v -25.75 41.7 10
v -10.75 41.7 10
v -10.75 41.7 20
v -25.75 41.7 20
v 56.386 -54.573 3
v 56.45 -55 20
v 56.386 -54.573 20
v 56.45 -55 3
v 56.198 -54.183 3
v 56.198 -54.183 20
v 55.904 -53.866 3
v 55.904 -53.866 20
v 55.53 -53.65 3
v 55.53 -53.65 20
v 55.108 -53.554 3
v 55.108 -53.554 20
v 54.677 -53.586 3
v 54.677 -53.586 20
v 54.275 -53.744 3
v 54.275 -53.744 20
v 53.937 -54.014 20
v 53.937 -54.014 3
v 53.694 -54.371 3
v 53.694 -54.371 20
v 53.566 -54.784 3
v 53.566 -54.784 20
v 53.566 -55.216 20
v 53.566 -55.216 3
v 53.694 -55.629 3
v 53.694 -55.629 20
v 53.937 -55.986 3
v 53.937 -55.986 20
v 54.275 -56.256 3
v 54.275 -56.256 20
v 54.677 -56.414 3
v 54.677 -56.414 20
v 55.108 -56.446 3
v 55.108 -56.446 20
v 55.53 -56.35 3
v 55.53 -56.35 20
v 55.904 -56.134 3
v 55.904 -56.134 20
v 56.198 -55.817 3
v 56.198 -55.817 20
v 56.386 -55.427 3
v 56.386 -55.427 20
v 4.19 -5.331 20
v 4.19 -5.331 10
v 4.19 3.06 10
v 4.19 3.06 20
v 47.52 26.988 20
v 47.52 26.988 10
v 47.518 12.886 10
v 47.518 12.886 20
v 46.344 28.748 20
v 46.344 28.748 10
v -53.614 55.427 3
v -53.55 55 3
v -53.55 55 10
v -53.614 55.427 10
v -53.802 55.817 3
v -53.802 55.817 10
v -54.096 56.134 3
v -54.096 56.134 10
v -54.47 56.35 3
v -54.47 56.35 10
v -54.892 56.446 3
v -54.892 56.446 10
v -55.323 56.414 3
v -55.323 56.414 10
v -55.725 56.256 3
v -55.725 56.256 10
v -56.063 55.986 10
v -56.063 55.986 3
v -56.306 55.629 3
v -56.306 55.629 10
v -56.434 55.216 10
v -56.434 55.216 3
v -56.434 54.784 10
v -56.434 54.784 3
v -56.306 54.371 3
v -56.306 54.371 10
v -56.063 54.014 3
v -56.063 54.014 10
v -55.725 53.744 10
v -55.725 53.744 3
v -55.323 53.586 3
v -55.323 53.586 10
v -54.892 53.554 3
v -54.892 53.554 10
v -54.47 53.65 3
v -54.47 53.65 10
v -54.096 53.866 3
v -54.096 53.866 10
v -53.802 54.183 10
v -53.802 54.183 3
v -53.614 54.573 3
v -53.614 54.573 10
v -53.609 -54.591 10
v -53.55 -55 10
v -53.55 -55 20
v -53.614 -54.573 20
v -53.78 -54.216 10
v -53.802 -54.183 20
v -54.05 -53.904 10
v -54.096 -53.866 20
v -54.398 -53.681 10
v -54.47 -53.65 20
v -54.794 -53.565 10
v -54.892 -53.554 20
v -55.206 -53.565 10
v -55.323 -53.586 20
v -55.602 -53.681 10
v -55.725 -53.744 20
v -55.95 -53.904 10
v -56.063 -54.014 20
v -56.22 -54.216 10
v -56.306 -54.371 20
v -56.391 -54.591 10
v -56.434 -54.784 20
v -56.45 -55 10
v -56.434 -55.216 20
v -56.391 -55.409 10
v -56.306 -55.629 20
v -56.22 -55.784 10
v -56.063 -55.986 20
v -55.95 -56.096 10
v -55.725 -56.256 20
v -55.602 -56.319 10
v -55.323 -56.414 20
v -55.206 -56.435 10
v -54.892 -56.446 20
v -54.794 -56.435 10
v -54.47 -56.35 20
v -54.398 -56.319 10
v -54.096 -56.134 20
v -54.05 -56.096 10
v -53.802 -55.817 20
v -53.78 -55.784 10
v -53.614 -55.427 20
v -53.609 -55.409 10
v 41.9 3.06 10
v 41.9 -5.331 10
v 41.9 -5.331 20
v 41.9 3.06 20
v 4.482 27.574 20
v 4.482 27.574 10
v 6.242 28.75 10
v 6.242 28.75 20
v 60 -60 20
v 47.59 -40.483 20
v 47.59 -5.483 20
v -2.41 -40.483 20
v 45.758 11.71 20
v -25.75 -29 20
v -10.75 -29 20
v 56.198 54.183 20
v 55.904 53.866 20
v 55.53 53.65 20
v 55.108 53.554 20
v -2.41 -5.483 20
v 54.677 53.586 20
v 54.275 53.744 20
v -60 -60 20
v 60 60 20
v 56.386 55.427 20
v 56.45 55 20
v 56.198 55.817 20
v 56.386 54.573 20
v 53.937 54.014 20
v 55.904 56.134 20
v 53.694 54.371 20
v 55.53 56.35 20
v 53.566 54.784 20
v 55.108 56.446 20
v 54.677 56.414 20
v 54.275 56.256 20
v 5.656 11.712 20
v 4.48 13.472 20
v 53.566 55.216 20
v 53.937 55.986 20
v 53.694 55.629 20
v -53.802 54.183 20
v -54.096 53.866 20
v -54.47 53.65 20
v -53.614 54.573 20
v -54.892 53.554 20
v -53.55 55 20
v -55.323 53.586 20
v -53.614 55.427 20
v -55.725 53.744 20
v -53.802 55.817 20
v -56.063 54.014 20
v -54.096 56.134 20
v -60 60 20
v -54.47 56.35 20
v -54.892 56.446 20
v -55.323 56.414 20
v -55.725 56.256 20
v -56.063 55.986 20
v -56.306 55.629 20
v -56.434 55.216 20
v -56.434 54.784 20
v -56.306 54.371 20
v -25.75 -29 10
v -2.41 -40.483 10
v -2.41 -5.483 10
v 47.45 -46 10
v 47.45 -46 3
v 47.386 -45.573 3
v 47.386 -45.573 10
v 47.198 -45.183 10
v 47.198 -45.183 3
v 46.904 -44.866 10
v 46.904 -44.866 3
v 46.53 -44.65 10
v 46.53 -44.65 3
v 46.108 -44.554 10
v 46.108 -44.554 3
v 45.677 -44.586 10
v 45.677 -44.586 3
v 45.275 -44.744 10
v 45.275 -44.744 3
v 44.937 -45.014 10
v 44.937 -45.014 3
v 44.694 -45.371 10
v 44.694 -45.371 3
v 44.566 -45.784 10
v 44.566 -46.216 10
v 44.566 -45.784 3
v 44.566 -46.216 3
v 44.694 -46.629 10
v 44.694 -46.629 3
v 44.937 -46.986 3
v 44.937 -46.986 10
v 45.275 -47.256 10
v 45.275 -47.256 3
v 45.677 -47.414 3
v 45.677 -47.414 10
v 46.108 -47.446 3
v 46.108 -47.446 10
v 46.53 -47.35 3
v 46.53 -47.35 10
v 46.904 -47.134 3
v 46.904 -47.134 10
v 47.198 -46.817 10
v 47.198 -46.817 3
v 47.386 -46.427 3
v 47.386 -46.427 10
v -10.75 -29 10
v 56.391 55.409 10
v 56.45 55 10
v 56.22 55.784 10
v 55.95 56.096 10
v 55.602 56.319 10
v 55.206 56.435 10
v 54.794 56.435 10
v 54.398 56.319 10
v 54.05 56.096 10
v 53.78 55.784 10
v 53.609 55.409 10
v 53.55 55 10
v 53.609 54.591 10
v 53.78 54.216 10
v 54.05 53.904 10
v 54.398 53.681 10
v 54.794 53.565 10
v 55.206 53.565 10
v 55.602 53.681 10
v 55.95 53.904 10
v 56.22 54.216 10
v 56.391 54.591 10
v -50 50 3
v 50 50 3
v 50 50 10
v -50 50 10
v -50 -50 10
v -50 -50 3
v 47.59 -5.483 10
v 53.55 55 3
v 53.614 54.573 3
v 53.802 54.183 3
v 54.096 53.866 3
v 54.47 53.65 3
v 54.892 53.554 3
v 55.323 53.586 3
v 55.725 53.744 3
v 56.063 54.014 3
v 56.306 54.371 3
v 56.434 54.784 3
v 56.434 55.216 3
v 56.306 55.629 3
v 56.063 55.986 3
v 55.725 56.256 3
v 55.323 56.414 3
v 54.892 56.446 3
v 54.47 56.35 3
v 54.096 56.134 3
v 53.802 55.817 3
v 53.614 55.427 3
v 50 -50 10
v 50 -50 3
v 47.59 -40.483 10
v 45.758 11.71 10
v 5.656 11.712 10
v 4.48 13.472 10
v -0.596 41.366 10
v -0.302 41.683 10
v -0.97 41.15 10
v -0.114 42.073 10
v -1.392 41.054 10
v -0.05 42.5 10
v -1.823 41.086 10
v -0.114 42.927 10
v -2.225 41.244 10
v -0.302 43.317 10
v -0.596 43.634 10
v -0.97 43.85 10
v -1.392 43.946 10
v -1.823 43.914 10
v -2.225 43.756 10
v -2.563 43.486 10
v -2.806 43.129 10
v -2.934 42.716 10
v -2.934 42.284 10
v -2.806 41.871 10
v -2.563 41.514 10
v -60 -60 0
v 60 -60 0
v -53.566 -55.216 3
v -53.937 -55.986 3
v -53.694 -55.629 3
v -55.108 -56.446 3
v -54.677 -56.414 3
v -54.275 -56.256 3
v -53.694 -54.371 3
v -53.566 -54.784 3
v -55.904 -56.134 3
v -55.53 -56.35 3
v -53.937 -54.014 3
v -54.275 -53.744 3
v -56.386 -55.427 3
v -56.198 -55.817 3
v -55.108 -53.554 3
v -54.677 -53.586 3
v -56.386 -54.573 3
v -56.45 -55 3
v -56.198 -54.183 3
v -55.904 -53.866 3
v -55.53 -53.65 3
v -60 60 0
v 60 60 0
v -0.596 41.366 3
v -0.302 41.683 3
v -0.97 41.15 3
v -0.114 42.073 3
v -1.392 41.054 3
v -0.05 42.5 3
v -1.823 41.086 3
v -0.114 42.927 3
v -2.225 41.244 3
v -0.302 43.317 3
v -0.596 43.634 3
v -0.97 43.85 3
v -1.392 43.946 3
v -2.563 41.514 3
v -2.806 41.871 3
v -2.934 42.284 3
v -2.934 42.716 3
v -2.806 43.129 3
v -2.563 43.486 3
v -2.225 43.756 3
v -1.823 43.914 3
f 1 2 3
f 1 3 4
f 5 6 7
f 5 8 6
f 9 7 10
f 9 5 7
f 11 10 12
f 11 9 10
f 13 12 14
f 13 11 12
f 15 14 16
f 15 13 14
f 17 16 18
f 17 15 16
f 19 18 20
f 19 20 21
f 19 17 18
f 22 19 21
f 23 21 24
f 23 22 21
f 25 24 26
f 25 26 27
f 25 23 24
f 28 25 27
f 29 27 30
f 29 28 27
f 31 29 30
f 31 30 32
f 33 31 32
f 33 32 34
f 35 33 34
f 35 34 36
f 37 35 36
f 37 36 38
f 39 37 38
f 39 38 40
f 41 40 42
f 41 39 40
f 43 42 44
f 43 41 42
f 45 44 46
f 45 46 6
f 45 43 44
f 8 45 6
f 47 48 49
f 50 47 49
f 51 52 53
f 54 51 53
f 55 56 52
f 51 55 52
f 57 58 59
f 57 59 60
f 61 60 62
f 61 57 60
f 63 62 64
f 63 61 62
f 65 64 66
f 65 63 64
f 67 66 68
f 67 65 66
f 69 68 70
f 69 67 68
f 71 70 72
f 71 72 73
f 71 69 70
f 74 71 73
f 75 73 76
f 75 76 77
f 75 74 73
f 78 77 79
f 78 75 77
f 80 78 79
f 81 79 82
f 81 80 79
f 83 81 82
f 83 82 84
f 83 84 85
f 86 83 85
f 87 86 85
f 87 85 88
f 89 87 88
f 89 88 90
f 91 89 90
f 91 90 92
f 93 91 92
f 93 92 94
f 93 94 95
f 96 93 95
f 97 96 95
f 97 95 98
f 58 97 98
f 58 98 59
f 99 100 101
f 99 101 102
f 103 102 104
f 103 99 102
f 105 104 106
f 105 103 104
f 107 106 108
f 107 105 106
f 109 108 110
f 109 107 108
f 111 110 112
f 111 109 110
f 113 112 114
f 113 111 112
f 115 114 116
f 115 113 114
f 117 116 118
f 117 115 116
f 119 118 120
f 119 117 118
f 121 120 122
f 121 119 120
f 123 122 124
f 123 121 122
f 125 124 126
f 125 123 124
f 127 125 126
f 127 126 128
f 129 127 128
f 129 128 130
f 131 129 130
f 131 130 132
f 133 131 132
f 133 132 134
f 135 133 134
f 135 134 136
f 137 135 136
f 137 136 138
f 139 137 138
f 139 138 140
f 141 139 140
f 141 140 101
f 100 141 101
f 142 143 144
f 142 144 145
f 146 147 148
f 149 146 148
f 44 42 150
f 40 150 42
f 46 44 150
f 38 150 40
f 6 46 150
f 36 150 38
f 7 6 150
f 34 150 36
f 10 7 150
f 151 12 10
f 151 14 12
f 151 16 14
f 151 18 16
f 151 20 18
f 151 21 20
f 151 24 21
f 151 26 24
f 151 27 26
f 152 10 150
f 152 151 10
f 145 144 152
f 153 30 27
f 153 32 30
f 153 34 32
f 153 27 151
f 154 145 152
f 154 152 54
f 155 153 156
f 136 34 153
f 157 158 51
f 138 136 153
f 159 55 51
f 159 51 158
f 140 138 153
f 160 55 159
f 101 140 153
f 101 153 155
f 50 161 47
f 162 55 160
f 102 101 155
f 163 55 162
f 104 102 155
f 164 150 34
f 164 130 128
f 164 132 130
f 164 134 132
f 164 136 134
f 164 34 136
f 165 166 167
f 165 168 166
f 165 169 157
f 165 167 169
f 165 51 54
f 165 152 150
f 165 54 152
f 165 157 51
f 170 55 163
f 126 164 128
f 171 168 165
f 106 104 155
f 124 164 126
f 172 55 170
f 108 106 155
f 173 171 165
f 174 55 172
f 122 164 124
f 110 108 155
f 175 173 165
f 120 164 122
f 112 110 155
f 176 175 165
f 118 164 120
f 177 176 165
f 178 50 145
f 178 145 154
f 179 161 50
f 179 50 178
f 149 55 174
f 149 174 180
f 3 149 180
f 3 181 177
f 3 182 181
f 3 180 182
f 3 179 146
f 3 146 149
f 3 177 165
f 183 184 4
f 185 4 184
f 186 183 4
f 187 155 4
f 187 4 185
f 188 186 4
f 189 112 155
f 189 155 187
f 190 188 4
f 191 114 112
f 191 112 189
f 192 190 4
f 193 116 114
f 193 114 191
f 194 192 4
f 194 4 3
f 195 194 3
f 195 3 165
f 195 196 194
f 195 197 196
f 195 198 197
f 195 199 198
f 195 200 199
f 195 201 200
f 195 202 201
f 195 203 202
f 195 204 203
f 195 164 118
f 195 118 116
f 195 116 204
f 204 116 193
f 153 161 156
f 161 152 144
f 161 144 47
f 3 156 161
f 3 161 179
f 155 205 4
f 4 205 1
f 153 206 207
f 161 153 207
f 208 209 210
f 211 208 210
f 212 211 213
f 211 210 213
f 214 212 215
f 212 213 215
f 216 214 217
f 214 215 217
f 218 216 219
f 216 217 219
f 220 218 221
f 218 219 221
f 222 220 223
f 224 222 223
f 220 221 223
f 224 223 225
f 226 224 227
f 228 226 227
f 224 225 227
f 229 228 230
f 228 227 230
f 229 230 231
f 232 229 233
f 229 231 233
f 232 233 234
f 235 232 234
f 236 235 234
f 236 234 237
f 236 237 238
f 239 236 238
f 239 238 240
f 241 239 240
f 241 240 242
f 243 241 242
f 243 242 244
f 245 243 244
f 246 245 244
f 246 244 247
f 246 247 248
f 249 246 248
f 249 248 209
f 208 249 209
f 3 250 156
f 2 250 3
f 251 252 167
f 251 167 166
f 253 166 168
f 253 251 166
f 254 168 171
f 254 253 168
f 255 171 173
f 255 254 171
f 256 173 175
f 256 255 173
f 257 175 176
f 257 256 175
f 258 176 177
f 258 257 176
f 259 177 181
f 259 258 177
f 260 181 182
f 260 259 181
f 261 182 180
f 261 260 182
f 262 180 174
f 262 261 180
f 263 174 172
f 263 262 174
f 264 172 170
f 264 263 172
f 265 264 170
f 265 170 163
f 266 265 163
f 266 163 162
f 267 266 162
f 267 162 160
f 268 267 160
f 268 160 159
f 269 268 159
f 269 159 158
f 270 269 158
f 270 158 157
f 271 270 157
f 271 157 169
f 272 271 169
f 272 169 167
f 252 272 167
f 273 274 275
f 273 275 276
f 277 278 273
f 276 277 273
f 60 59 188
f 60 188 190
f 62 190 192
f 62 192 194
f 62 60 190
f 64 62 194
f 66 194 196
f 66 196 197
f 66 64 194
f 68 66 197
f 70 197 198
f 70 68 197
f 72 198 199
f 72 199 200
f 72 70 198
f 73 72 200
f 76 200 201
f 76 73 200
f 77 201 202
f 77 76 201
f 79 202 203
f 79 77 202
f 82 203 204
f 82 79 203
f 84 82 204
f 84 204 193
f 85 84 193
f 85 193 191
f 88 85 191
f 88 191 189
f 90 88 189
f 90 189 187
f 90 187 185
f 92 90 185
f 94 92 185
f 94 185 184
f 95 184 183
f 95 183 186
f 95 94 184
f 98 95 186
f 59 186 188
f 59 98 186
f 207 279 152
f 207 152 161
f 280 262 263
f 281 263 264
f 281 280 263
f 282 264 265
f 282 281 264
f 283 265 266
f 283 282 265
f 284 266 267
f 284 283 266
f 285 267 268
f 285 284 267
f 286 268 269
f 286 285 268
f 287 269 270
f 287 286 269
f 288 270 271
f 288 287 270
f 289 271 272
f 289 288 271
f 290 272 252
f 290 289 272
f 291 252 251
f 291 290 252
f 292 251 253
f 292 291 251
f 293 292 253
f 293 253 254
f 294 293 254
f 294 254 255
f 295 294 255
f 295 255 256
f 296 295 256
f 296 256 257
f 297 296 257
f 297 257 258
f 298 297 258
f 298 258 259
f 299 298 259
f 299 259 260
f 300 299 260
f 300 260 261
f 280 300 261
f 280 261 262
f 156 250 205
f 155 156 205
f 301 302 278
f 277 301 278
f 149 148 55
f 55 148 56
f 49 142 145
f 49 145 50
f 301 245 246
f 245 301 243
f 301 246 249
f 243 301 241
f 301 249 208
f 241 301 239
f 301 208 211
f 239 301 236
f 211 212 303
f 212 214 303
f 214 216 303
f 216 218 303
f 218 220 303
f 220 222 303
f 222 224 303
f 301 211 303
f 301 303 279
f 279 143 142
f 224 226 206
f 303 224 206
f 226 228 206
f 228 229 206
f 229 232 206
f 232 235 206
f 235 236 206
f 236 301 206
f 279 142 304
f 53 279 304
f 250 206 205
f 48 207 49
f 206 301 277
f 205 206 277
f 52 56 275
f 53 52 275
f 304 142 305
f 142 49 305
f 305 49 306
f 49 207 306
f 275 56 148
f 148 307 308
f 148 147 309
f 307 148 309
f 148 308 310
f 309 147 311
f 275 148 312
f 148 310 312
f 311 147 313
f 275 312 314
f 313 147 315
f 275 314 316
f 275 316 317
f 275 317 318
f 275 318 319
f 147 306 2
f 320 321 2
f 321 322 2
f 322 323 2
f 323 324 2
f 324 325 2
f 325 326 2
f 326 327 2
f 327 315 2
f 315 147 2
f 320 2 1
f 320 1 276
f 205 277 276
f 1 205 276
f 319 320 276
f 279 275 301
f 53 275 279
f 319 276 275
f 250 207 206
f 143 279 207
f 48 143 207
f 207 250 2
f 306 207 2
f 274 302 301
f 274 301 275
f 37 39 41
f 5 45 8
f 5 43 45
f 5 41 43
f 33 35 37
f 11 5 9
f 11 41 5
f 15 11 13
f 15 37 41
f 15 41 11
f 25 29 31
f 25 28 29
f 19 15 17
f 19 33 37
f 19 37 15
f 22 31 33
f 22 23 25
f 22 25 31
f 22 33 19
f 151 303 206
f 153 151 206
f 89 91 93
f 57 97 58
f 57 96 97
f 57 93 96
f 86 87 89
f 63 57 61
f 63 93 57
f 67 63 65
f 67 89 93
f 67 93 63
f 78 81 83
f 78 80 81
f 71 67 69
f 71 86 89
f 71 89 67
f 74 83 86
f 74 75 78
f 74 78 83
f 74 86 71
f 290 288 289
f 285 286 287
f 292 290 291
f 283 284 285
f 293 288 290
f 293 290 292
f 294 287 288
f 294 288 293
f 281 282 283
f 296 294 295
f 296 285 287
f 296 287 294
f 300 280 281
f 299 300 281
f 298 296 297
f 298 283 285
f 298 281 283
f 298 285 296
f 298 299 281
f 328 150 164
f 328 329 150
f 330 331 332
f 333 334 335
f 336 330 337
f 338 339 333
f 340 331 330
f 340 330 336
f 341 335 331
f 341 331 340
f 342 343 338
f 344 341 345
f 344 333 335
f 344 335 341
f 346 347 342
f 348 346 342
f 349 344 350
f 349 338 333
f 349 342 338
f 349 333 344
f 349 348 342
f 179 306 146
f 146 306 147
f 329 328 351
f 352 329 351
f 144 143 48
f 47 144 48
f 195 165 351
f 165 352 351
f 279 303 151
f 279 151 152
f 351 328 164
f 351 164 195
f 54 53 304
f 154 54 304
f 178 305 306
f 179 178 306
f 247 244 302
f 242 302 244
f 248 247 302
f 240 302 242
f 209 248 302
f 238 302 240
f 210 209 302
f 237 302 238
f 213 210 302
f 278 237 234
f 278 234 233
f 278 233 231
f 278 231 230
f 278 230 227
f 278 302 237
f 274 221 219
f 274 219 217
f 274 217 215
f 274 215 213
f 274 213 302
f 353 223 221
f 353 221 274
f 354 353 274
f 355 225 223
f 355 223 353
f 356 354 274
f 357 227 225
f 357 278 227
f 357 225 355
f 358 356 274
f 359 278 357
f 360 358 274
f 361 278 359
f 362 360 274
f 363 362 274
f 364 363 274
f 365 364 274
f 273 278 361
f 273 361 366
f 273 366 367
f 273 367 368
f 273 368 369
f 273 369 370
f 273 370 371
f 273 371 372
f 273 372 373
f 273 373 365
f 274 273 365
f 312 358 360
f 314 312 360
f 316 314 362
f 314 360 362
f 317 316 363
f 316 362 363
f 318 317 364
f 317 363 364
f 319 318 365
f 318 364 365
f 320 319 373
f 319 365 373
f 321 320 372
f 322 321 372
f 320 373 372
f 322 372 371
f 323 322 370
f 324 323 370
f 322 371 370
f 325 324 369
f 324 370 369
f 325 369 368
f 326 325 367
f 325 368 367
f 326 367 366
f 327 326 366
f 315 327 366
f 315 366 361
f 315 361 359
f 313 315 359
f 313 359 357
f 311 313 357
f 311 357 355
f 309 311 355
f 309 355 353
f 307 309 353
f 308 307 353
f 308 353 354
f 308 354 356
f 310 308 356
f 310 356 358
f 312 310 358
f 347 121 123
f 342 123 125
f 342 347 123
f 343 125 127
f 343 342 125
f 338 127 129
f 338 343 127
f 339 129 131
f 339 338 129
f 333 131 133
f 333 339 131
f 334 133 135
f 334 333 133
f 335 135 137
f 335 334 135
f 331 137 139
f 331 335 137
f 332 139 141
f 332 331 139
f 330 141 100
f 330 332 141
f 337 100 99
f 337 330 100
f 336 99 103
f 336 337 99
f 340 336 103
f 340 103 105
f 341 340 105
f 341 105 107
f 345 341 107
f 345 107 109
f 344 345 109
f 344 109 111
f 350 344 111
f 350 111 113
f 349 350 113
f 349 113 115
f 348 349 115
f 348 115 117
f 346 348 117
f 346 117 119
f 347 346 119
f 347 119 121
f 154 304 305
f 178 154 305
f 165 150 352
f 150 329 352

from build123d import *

# Parameters (mm, degrees)
SKETCH1_W           = 120
SKETCH1_H           = 120
BOSS_EXTRUDE1_DEPTH = 3
SKETCH1_3_W         = 120
SKETCH1_3_H         = 120
SKETCH1_3_R         = 1.45
SKETCH1_3_W_2       = 100
SKETCH1_3_H_2       = 100
BOSS_EXTRUDE2_DEPTH = 10
BOSS_EXTRUDE3_START = 10
SKETCH5_W           = 120
SKETCH5_H           = 120
SKETCH5_R           = 1.45
SKETCH5_W_2         = 70.699570221
SKETCH5_H_2         = 15
SKETCH5_W_3         = 35
SKETCH5_H_3         = 50
SKETCH5_W_4         = 8.3907815
SKETCH5_H_4         = 37.710608616
BOSS_EXTRUDE3_DEPTH = 10


with BuildPart() as part:
    # Sketch1 → Boss-Extrude1 (new body)
    with BuildSketch(Plane(origin=(0, 0, 0), x_dir=(0, 1, 0), z_dir=(0, 0, 1))):
        Rectangle(SKETCH1_W, SKETCH1_H)
    extrude(amount=BOSS_EXTRUDE1_DEPTH)

    # Sketch1<3> → Boss-Extrude2 (add)
    # profile 1 of 3: a face of its own
    with BuildSketch(Plane(origin=(0, 0, 0), x_dir=(0, 1, 0), z_dir=(0, 0, 1))):
        Rectangle(SKETCH1_3_W, SKETCH1_3_H)
        with Locations(Location((-55, -55, 0), (0, 0, 270))):
            Circle(SKETCH1_3_R, mode=Mode.SUBTRACT)
        with Locations(Location((-55, 55, 0), (0, 0, 90))):
            Circle(SKETCH1_3_R, mode=Mode.SUBTRACT)
        with Locations(Location((55, -55, 0), (0, 0, 90))):
            Circle(SKETCH1_3_R, mode=Mode.SUBTRACT)
        with Locations(Location((55, 55, 0), (0, 0, 270))):
            Circle(SKETCH1_3_R, mode=Mode.SUBTRACT)
        Rectangle(SKETCH1_3_W_2, SKETCH1_3_H_2, mode=Mode.SUBTRACT)
    # profile 2 of 3: a face of its own
    with BuildSketch(Plane(origin=(0, 0, 0), x_dir=(0, 1, 0), z_dir=(0, 0, 1))):
        with Locations(Location((42.5, 1.5, 0), (0, 0, 270))):
            Circle(SKETCH1_3_R)
    # profile 3 of 3: a face of its own
    with BuildSketch(Plane(origin=(0, 0, 0), x_dir=(0, 1, 0), z_dir=(0, 0, 1))):
        with Locations(Location((-46, -46, 0), (0, 0, 270))):
            Circle(SKETCH1_3_R)
    extrude(amount=BOSS_EXTRUDE2_DEPTH)

    # Sketch5 → Boss-Extrude3 (add)
    with BuildSketch(Plane(origin=(0, 0, 0), x_dir=(0, 1, 0), z_dir=(0, 0, 1)).offset(BOSS_EXTRUDE3_START)):
        Rectangle(SKETCH5_W, SKETCH5_H)
        with Locations(Location((-55, -55, 0), (0, 0, 270))):
            Circle(SKETCH5_R, mode=Mode.SUBTRACT)
        with Locations(Location((-55, 55, 0), (0, 0, 270))):
            Circle(SKETCH5_R, mode=Mode.SUBTRACT)
        with Locations(Location((55, -55, 0), (0, 0, 270))):
            Circle(SKETCH5_R, mode=Mode.SUBTRACT)
        with Locations(Location((55, 55, 0), (0, 0, 270))):
            Circle(SKETCH5_R, mode=Mode.SUBTRACT)
        with Locations((6.34978511, 18.25)):
            Rectangle(SKETCH5_W_2, SKETCH5_H_2, mode=Mode.SUBTRACT)
        with Locations((-22.982605132, -22.59)):
            Rectangle(SKETCH5_W_3, SKETCH5_H_3, mode=Mode.SUBTRACT)
        with Locations((-1.13563625, -23.044910308)):
            Rectangle(SKETCH5_W_4, SKETCH5_H_4, mode=Mode.SUBTRACT)
        Polygon((27.574081379, -4.481691375), (28.750030367, -6.241709633), (28.748424488, -46.344003965), (26.988191952, -47.520096123), (12.885918621, -47.518308625), (11.709969633, -45.758290367), (11.711575511, -5.655996035), (13.471808048, -4.479903877), align=None, mode=Mode.SUBTRACT)
    extrude(amount=BOSS_EXTRUDE3_DEPTH)


solid = part.part
